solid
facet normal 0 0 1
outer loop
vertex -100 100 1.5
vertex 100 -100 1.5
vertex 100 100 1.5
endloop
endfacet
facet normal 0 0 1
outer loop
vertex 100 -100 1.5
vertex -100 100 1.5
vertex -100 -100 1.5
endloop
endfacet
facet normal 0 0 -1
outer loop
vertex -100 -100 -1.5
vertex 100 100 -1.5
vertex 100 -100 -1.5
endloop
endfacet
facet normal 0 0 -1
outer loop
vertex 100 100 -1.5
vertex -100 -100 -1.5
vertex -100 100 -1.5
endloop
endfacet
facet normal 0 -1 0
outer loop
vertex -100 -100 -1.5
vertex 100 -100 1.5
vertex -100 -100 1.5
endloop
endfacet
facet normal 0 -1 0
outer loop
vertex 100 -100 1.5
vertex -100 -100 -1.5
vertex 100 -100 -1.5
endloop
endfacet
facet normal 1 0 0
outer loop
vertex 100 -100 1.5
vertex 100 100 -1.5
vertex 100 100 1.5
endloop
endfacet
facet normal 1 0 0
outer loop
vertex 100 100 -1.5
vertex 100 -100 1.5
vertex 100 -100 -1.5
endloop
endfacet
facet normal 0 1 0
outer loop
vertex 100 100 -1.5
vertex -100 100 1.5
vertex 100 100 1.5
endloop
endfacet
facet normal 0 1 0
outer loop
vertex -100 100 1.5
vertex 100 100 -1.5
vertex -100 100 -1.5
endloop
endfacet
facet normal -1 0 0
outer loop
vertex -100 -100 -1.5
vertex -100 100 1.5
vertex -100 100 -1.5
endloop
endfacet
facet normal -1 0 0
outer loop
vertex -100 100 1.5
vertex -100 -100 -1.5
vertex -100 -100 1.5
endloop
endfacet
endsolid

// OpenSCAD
$fn=64;

module sheet_acrylic(length=200, width=200, thickness=3, center_xy=true) {
    translate([0,0,0])
        cube([length, width, thickness], center=center_xy);
}

sheet_acrylic(length=200, width=200, thickness=3, center_xy=true);
